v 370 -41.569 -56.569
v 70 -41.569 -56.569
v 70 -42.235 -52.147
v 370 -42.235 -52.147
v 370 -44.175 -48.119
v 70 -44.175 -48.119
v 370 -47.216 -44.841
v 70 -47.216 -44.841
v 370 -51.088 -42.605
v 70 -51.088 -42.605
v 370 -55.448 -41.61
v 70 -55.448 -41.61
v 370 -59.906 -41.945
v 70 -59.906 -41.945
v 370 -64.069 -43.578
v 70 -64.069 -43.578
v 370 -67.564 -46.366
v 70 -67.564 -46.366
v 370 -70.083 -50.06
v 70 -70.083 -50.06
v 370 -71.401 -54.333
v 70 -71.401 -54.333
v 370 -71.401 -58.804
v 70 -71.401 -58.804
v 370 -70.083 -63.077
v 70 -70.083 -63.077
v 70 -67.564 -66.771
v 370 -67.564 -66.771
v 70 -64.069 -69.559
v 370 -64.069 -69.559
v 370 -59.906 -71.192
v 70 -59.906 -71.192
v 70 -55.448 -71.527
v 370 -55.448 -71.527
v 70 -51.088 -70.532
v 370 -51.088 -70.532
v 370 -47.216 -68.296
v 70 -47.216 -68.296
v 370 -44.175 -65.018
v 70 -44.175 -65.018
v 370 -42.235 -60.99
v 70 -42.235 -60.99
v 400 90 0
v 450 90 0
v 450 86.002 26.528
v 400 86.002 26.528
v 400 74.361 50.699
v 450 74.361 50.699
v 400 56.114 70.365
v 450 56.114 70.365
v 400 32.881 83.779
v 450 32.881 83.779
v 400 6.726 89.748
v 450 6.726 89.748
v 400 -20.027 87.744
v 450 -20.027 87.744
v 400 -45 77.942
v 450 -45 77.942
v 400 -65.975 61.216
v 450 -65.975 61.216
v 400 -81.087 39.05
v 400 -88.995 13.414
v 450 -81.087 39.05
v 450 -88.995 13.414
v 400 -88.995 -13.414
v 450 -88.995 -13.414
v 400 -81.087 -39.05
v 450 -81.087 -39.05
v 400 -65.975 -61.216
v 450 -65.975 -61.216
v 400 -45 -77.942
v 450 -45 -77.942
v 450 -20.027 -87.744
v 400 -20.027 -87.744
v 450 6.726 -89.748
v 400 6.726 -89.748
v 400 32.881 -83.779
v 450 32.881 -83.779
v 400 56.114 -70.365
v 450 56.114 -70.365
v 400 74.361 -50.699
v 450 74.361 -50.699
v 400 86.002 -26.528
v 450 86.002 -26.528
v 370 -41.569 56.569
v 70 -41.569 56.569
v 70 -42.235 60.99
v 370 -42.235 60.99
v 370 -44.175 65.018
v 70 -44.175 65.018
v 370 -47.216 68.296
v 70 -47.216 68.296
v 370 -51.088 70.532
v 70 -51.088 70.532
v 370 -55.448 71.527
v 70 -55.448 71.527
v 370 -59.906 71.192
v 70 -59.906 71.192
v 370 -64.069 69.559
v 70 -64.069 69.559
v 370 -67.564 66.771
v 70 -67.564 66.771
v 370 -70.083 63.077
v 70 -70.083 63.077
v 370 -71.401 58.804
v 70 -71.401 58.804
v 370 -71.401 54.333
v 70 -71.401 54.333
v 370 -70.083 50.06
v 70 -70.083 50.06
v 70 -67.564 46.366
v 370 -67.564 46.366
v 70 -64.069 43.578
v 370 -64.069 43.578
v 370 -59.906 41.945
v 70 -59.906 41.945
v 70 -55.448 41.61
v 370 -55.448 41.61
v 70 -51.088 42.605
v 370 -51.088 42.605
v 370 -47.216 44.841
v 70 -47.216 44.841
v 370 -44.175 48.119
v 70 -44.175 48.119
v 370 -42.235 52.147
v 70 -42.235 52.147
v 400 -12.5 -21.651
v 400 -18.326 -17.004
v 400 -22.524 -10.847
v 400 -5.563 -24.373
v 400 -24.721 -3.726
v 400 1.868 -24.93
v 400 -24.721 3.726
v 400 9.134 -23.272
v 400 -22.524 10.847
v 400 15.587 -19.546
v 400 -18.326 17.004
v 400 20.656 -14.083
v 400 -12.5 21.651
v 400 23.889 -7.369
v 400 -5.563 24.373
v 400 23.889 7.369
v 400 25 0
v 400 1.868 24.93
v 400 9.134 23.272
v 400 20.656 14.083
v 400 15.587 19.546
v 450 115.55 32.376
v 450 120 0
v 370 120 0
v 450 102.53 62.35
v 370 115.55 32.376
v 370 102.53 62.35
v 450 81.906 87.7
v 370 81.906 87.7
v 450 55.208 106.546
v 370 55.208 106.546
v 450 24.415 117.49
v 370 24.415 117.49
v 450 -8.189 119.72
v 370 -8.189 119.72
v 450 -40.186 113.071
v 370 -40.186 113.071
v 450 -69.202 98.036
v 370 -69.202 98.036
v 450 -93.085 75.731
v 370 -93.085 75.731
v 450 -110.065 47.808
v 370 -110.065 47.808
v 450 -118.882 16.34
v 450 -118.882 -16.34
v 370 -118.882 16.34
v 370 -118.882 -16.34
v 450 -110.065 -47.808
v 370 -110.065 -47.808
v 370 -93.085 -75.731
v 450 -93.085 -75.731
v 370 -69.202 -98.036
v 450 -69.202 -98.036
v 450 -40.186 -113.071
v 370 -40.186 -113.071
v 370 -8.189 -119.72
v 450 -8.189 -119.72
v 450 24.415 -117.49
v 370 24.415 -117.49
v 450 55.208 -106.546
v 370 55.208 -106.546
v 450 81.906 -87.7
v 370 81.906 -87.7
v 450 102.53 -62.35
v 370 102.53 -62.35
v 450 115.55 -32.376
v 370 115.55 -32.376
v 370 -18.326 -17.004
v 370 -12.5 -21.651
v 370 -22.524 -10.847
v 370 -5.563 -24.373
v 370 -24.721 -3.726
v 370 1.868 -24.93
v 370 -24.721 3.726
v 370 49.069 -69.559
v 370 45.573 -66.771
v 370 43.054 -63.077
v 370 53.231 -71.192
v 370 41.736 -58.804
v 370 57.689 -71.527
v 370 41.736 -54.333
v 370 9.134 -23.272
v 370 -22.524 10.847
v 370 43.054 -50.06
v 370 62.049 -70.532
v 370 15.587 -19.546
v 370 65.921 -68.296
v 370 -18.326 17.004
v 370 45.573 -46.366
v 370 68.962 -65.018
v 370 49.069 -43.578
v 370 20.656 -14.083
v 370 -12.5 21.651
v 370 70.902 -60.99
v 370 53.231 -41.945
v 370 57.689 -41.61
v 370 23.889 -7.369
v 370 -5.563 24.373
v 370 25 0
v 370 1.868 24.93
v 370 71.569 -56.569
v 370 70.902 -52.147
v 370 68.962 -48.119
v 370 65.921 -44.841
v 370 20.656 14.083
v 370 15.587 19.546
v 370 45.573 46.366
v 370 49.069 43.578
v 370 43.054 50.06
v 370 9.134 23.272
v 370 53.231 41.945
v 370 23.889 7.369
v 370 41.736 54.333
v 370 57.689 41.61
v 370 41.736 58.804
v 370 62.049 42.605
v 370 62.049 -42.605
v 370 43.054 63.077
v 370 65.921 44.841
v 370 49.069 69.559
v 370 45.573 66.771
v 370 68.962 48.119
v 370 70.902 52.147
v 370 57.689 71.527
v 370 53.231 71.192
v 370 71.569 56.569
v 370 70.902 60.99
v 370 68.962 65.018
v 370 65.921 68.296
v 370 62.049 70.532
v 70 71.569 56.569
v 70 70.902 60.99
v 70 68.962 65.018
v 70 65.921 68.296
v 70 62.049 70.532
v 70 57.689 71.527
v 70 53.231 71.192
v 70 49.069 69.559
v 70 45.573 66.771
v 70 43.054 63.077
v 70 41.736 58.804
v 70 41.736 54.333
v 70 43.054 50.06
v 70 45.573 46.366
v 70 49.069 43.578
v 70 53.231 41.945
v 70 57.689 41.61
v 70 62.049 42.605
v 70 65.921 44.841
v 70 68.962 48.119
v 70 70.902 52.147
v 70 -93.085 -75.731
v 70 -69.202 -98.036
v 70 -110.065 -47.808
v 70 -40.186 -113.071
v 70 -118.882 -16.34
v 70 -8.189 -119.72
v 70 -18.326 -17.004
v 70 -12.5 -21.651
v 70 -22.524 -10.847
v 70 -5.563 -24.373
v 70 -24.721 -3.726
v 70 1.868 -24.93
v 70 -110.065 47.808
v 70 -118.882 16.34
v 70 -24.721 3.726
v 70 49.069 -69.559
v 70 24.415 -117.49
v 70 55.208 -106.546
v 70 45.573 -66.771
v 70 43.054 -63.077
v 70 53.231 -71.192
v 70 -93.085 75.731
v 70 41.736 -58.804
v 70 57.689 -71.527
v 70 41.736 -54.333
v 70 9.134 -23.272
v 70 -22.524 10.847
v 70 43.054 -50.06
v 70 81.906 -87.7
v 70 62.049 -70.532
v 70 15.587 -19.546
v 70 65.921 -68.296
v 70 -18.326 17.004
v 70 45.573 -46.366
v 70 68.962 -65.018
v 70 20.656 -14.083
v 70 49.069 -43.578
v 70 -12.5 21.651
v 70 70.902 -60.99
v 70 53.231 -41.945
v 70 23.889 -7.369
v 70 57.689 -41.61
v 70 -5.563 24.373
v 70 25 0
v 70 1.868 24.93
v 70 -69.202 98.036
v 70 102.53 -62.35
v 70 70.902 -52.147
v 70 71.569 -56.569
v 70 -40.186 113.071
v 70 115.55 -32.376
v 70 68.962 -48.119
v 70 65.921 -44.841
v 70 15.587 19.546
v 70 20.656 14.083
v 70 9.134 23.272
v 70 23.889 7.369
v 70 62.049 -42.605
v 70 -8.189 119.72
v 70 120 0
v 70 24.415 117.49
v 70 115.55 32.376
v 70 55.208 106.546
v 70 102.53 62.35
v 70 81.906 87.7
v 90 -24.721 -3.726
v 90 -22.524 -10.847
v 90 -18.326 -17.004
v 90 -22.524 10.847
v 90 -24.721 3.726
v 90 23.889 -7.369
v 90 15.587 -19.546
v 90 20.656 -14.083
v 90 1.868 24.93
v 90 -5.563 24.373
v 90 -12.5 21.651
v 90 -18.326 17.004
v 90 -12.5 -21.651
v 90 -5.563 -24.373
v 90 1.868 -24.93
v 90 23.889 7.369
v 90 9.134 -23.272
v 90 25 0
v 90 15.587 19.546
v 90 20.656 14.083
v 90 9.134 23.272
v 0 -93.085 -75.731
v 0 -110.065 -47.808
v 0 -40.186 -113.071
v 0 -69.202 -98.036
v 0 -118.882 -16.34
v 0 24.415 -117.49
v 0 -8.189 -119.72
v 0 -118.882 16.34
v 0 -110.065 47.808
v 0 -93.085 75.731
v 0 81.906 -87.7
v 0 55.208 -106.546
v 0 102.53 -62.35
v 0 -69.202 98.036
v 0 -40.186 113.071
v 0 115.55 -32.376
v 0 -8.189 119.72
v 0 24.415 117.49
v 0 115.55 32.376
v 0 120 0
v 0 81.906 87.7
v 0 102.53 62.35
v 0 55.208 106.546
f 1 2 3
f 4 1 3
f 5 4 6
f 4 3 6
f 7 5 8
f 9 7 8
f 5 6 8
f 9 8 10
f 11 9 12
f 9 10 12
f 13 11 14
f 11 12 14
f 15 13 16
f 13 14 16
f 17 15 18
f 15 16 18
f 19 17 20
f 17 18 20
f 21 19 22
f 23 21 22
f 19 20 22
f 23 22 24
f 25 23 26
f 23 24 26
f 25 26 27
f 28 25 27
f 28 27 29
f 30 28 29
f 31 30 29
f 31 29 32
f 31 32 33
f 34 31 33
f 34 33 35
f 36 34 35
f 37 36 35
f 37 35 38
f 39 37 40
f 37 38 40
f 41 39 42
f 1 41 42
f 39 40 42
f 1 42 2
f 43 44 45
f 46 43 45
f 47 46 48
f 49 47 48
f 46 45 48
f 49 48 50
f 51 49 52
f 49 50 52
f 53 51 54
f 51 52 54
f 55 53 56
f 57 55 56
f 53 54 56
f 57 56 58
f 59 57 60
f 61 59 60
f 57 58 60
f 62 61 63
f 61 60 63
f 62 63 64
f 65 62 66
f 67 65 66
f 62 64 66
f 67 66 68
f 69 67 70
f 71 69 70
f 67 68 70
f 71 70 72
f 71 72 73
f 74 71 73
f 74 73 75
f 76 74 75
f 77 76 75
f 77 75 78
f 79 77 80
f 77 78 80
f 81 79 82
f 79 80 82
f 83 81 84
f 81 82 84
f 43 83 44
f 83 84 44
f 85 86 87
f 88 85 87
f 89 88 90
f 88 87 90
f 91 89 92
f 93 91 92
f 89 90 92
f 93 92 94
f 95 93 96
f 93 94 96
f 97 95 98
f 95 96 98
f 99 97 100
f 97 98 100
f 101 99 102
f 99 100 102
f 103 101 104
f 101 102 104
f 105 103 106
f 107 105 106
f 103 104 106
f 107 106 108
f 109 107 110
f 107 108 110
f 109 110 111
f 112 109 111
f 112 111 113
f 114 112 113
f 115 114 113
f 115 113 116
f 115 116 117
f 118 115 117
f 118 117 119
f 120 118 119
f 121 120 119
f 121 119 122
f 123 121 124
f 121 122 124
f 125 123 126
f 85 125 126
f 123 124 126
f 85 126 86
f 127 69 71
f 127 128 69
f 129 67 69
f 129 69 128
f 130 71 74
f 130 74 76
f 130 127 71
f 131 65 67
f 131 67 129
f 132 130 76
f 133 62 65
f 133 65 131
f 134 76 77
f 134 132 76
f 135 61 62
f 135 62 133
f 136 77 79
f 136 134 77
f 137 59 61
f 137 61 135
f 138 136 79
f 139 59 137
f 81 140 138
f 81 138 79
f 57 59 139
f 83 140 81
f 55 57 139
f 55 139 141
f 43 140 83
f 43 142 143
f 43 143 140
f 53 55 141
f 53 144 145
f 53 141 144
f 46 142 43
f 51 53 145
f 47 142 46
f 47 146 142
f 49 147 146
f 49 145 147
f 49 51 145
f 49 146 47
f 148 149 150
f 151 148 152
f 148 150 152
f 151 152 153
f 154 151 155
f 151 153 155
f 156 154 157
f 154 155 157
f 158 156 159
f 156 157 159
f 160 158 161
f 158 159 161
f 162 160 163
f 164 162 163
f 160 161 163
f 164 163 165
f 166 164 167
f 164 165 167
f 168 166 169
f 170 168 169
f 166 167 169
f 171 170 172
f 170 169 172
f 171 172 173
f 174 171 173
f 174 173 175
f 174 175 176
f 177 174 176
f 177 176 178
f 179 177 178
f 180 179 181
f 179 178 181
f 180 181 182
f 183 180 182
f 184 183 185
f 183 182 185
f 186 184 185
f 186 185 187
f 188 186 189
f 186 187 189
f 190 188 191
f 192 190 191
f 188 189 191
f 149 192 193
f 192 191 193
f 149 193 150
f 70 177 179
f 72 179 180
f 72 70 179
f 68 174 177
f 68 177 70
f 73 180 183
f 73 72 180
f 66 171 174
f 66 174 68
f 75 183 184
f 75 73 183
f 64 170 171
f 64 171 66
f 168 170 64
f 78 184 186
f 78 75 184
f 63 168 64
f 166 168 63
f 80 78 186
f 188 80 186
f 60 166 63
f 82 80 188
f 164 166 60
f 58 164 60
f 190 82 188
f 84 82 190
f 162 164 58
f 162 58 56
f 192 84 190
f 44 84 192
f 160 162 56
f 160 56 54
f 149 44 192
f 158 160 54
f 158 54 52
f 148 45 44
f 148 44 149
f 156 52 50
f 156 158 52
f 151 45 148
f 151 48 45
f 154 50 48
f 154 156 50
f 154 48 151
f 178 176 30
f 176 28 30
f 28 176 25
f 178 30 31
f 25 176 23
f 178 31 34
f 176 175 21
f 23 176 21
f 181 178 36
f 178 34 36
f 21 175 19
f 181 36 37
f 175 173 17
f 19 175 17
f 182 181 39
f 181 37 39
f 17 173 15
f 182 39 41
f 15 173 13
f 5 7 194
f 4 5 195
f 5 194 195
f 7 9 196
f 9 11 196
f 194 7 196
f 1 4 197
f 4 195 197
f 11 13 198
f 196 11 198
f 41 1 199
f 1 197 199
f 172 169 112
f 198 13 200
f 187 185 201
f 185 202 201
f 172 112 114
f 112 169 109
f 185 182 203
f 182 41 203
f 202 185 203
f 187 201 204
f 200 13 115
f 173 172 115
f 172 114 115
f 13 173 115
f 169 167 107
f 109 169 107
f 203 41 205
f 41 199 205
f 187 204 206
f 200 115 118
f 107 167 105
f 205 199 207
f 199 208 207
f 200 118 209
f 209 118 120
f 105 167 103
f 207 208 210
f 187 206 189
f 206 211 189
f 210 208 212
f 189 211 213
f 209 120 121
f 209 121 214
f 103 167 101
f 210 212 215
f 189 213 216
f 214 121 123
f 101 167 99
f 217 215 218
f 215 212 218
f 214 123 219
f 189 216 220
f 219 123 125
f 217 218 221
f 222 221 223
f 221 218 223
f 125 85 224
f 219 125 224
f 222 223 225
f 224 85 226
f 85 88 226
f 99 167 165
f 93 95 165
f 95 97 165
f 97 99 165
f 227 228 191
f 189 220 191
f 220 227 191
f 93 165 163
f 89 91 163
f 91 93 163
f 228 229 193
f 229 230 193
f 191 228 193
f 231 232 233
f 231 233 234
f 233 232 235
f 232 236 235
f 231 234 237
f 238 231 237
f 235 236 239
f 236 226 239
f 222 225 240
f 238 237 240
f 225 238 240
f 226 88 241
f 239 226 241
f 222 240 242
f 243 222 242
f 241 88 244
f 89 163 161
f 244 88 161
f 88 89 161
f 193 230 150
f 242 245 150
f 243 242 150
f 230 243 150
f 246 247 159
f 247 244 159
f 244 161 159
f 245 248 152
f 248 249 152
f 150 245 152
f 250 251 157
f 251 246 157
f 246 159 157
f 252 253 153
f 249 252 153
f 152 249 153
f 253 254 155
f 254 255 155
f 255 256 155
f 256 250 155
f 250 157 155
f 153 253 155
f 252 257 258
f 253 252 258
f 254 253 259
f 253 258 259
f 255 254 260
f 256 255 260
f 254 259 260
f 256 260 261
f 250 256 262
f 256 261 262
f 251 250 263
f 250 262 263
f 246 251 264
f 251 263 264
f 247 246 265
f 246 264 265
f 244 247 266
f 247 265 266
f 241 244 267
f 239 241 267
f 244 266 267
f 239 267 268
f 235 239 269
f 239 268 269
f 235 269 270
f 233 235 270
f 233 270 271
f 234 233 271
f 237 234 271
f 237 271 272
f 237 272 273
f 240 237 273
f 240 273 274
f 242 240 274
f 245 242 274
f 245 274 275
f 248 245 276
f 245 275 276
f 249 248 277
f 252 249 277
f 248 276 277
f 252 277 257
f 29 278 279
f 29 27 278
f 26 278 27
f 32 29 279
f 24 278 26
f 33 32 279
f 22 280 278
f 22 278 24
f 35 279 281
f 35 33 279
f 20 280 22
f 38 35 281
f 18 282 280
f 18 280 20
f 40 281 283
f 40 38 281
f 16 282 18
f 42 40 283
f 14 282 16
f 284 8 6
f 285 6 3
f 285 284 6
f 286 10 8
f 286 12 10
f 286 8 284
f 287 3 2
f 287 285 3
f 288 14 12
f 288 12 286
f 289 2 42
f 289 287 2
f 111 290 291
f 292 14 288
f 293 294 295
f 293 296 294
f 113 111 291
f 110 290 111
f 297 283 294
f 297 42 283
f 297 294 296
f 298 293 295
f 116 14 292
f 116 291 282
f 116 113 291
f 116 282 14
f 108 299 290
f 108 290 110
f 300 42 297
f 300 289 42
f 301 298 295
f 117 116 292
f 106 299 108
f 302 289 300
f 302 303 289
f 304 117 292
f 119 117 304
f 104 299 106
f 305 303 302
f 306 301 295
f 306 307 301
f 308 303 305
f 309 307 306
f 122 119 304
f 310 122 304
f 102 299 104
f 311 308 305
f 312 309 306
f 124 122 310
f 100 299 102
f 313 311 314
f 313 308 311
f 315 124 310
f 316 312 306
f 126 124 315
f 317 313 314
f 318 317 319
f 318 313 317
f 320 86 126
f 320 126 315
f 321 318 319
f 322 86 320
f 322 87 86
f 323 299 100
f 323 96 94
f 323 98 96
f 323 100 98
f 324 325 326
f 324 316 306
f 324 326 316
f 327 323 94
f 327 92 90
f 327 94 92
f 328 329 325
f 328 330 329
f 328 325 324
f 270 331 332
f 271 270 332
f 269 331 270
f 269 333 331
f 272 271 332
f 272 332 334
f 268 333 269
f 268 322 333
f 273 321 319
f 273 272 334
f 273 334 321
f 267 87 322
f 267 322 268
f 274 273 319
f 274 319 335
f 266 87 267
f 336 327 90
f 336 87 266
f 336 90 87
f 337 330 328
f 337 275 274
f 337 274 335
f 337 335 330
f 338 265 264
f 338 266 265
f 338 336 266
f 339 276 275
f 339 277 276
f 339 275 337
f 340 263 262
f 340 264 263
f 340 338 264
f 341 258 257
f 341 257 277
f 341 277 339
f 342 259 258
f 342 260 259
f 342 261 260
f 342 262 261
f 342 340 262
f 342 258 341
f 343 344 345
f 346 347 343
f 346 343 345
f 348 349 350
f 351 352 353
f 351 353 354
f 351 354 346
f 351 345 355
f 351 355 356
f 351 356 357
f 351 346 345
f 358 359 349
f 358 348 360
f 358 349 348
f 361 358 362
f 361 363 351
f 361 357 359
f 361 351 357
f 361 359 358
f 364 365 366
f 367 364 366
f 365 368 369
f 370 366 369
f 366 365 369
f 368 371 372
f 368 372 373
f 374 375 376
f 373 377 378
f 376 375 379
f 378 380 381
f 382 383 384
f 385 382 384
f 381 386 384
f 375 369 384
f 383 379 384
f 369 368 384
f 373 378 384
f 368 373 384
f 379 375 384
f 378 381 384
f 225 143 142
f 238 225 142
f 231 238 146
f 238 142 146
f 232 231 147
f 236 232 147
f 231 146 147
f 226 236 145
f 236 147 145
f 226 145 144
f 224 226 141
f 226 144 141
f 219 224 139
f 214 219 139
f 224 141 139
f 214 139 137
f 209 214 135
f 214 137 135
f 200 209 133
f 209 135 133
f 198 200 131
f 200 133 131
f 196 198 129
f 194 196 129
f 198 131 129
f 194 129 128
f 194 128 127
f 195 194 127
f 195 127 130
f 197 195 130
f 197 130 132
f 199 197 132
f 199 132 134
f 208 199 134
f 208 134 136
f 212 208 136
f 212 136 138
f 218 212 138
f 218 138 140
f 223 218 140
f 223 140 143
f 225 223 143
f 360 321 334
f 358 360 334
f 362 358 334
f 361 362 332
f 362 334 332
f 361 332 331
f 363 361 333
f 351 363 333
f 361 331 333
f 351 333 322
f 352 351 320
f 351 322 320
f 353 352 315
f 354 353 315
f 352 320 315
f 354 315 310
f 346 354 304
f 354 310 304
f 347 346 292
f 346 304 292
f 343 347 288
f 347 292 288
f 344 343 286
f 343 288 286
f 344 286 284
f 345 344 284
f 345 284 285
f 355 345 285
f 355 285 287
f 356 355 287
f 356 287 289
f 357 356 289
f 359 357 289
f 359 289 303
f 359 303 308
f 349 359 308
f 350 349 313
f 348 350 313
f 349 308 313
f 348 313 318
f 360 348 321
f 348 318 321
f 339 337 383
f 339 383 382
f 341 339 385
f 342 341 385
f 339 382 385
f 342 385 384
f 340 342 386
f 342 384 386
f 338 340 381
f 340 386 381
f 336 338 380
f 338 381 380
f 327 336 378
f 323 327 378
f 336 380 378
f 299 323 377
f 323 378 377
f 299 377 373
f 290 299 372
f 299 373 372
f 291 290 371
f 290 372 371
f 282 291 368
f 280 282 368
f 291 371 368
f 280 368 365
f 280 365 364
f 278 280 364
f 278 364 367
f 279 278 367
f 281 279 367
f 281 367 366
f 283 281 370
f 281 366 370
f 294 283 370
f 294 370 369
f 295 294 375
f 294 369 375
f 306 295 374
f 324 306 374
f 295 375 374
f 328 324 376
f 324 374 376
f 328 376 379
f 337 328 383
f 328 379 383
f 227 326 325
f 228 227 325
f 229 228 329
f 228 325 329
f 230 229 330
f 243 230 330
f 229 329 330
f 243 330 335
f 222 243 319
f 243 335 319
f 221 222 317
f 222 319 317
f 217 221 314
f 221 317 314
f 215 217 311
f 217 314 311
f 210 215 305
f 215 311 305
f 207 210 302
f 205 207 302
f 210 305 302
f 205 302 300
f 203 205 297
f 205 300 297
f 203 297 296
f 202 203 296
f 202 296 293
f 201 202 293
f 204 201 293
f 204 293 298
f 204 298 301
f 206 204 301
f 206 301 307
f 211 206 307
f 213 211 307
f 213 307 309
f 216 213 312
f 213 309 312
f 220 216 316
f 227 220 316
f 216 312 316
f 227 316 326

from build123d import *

# Parameters (mm, degrees)
F0_R      = 120
F1_DEPTH  = 70
F2_R      = 25
F3_DEPTH  = 20
F4_R      = 15
F5_DEPTH  = 300
F6_R      = 120
F7_DEPTH  = 80
F8_R      = 90
F9_DEPTH  = 50
F10_R     = 25
F11_DEPTH = 60


with BuildPart() as f1:
    # F0 (on Right) → F1 (new body)
    with BuildSketch(Plane.YZ):
        Circle(F0_R)
    extrude(amount=F1_DEPTH)

    # F2 (on face) → F3 (join)
    with BuildSketch(Plane.YZ.offset(70)):
        Circle(F2_R)
    extrude(amount=F3_DEPTH)

    # F4 (on face) → F5 (join)
    with BuildSketch(Plane.YZ.offset(70)):
        with Locations((-56.5685424949, -56.5685424949)):
            Circle(F4_R)
        with Locations((-56.5685424949, 56.5685424949)):
            Circle(F4_R)
        with Locations((56.5685424949, 56.5685424949)):
            Circle(F4_R)
        with Locations((56.5685424949, -56.5685424949)):
            Circle(F4_R)
    extrude(amount=F5_DEPTH)

    # F6 (on face) → F7 (join)
    with BuildSketch(Plane.YZ.offset(370)):
        Circle(F6_R)
    extrude(amount=F7_DEPTH)

    # F8 (on face) → F9 (cut)
    with BuildSketch(Plane.YZ.offset(450)):
        Circle(F8_R)
    extrude(amount=-F9_DEPTH, mode=Mode.SUBTRACT)

    # F10 (on face) → F11 (cut)
    with BuildSketch(Plane.YZ.offset(400)):
        Circle(F10_R)
    extrude(amount=-F11_DEPTH, mode=Mode.SUBTRACT)


solid = f1.part
